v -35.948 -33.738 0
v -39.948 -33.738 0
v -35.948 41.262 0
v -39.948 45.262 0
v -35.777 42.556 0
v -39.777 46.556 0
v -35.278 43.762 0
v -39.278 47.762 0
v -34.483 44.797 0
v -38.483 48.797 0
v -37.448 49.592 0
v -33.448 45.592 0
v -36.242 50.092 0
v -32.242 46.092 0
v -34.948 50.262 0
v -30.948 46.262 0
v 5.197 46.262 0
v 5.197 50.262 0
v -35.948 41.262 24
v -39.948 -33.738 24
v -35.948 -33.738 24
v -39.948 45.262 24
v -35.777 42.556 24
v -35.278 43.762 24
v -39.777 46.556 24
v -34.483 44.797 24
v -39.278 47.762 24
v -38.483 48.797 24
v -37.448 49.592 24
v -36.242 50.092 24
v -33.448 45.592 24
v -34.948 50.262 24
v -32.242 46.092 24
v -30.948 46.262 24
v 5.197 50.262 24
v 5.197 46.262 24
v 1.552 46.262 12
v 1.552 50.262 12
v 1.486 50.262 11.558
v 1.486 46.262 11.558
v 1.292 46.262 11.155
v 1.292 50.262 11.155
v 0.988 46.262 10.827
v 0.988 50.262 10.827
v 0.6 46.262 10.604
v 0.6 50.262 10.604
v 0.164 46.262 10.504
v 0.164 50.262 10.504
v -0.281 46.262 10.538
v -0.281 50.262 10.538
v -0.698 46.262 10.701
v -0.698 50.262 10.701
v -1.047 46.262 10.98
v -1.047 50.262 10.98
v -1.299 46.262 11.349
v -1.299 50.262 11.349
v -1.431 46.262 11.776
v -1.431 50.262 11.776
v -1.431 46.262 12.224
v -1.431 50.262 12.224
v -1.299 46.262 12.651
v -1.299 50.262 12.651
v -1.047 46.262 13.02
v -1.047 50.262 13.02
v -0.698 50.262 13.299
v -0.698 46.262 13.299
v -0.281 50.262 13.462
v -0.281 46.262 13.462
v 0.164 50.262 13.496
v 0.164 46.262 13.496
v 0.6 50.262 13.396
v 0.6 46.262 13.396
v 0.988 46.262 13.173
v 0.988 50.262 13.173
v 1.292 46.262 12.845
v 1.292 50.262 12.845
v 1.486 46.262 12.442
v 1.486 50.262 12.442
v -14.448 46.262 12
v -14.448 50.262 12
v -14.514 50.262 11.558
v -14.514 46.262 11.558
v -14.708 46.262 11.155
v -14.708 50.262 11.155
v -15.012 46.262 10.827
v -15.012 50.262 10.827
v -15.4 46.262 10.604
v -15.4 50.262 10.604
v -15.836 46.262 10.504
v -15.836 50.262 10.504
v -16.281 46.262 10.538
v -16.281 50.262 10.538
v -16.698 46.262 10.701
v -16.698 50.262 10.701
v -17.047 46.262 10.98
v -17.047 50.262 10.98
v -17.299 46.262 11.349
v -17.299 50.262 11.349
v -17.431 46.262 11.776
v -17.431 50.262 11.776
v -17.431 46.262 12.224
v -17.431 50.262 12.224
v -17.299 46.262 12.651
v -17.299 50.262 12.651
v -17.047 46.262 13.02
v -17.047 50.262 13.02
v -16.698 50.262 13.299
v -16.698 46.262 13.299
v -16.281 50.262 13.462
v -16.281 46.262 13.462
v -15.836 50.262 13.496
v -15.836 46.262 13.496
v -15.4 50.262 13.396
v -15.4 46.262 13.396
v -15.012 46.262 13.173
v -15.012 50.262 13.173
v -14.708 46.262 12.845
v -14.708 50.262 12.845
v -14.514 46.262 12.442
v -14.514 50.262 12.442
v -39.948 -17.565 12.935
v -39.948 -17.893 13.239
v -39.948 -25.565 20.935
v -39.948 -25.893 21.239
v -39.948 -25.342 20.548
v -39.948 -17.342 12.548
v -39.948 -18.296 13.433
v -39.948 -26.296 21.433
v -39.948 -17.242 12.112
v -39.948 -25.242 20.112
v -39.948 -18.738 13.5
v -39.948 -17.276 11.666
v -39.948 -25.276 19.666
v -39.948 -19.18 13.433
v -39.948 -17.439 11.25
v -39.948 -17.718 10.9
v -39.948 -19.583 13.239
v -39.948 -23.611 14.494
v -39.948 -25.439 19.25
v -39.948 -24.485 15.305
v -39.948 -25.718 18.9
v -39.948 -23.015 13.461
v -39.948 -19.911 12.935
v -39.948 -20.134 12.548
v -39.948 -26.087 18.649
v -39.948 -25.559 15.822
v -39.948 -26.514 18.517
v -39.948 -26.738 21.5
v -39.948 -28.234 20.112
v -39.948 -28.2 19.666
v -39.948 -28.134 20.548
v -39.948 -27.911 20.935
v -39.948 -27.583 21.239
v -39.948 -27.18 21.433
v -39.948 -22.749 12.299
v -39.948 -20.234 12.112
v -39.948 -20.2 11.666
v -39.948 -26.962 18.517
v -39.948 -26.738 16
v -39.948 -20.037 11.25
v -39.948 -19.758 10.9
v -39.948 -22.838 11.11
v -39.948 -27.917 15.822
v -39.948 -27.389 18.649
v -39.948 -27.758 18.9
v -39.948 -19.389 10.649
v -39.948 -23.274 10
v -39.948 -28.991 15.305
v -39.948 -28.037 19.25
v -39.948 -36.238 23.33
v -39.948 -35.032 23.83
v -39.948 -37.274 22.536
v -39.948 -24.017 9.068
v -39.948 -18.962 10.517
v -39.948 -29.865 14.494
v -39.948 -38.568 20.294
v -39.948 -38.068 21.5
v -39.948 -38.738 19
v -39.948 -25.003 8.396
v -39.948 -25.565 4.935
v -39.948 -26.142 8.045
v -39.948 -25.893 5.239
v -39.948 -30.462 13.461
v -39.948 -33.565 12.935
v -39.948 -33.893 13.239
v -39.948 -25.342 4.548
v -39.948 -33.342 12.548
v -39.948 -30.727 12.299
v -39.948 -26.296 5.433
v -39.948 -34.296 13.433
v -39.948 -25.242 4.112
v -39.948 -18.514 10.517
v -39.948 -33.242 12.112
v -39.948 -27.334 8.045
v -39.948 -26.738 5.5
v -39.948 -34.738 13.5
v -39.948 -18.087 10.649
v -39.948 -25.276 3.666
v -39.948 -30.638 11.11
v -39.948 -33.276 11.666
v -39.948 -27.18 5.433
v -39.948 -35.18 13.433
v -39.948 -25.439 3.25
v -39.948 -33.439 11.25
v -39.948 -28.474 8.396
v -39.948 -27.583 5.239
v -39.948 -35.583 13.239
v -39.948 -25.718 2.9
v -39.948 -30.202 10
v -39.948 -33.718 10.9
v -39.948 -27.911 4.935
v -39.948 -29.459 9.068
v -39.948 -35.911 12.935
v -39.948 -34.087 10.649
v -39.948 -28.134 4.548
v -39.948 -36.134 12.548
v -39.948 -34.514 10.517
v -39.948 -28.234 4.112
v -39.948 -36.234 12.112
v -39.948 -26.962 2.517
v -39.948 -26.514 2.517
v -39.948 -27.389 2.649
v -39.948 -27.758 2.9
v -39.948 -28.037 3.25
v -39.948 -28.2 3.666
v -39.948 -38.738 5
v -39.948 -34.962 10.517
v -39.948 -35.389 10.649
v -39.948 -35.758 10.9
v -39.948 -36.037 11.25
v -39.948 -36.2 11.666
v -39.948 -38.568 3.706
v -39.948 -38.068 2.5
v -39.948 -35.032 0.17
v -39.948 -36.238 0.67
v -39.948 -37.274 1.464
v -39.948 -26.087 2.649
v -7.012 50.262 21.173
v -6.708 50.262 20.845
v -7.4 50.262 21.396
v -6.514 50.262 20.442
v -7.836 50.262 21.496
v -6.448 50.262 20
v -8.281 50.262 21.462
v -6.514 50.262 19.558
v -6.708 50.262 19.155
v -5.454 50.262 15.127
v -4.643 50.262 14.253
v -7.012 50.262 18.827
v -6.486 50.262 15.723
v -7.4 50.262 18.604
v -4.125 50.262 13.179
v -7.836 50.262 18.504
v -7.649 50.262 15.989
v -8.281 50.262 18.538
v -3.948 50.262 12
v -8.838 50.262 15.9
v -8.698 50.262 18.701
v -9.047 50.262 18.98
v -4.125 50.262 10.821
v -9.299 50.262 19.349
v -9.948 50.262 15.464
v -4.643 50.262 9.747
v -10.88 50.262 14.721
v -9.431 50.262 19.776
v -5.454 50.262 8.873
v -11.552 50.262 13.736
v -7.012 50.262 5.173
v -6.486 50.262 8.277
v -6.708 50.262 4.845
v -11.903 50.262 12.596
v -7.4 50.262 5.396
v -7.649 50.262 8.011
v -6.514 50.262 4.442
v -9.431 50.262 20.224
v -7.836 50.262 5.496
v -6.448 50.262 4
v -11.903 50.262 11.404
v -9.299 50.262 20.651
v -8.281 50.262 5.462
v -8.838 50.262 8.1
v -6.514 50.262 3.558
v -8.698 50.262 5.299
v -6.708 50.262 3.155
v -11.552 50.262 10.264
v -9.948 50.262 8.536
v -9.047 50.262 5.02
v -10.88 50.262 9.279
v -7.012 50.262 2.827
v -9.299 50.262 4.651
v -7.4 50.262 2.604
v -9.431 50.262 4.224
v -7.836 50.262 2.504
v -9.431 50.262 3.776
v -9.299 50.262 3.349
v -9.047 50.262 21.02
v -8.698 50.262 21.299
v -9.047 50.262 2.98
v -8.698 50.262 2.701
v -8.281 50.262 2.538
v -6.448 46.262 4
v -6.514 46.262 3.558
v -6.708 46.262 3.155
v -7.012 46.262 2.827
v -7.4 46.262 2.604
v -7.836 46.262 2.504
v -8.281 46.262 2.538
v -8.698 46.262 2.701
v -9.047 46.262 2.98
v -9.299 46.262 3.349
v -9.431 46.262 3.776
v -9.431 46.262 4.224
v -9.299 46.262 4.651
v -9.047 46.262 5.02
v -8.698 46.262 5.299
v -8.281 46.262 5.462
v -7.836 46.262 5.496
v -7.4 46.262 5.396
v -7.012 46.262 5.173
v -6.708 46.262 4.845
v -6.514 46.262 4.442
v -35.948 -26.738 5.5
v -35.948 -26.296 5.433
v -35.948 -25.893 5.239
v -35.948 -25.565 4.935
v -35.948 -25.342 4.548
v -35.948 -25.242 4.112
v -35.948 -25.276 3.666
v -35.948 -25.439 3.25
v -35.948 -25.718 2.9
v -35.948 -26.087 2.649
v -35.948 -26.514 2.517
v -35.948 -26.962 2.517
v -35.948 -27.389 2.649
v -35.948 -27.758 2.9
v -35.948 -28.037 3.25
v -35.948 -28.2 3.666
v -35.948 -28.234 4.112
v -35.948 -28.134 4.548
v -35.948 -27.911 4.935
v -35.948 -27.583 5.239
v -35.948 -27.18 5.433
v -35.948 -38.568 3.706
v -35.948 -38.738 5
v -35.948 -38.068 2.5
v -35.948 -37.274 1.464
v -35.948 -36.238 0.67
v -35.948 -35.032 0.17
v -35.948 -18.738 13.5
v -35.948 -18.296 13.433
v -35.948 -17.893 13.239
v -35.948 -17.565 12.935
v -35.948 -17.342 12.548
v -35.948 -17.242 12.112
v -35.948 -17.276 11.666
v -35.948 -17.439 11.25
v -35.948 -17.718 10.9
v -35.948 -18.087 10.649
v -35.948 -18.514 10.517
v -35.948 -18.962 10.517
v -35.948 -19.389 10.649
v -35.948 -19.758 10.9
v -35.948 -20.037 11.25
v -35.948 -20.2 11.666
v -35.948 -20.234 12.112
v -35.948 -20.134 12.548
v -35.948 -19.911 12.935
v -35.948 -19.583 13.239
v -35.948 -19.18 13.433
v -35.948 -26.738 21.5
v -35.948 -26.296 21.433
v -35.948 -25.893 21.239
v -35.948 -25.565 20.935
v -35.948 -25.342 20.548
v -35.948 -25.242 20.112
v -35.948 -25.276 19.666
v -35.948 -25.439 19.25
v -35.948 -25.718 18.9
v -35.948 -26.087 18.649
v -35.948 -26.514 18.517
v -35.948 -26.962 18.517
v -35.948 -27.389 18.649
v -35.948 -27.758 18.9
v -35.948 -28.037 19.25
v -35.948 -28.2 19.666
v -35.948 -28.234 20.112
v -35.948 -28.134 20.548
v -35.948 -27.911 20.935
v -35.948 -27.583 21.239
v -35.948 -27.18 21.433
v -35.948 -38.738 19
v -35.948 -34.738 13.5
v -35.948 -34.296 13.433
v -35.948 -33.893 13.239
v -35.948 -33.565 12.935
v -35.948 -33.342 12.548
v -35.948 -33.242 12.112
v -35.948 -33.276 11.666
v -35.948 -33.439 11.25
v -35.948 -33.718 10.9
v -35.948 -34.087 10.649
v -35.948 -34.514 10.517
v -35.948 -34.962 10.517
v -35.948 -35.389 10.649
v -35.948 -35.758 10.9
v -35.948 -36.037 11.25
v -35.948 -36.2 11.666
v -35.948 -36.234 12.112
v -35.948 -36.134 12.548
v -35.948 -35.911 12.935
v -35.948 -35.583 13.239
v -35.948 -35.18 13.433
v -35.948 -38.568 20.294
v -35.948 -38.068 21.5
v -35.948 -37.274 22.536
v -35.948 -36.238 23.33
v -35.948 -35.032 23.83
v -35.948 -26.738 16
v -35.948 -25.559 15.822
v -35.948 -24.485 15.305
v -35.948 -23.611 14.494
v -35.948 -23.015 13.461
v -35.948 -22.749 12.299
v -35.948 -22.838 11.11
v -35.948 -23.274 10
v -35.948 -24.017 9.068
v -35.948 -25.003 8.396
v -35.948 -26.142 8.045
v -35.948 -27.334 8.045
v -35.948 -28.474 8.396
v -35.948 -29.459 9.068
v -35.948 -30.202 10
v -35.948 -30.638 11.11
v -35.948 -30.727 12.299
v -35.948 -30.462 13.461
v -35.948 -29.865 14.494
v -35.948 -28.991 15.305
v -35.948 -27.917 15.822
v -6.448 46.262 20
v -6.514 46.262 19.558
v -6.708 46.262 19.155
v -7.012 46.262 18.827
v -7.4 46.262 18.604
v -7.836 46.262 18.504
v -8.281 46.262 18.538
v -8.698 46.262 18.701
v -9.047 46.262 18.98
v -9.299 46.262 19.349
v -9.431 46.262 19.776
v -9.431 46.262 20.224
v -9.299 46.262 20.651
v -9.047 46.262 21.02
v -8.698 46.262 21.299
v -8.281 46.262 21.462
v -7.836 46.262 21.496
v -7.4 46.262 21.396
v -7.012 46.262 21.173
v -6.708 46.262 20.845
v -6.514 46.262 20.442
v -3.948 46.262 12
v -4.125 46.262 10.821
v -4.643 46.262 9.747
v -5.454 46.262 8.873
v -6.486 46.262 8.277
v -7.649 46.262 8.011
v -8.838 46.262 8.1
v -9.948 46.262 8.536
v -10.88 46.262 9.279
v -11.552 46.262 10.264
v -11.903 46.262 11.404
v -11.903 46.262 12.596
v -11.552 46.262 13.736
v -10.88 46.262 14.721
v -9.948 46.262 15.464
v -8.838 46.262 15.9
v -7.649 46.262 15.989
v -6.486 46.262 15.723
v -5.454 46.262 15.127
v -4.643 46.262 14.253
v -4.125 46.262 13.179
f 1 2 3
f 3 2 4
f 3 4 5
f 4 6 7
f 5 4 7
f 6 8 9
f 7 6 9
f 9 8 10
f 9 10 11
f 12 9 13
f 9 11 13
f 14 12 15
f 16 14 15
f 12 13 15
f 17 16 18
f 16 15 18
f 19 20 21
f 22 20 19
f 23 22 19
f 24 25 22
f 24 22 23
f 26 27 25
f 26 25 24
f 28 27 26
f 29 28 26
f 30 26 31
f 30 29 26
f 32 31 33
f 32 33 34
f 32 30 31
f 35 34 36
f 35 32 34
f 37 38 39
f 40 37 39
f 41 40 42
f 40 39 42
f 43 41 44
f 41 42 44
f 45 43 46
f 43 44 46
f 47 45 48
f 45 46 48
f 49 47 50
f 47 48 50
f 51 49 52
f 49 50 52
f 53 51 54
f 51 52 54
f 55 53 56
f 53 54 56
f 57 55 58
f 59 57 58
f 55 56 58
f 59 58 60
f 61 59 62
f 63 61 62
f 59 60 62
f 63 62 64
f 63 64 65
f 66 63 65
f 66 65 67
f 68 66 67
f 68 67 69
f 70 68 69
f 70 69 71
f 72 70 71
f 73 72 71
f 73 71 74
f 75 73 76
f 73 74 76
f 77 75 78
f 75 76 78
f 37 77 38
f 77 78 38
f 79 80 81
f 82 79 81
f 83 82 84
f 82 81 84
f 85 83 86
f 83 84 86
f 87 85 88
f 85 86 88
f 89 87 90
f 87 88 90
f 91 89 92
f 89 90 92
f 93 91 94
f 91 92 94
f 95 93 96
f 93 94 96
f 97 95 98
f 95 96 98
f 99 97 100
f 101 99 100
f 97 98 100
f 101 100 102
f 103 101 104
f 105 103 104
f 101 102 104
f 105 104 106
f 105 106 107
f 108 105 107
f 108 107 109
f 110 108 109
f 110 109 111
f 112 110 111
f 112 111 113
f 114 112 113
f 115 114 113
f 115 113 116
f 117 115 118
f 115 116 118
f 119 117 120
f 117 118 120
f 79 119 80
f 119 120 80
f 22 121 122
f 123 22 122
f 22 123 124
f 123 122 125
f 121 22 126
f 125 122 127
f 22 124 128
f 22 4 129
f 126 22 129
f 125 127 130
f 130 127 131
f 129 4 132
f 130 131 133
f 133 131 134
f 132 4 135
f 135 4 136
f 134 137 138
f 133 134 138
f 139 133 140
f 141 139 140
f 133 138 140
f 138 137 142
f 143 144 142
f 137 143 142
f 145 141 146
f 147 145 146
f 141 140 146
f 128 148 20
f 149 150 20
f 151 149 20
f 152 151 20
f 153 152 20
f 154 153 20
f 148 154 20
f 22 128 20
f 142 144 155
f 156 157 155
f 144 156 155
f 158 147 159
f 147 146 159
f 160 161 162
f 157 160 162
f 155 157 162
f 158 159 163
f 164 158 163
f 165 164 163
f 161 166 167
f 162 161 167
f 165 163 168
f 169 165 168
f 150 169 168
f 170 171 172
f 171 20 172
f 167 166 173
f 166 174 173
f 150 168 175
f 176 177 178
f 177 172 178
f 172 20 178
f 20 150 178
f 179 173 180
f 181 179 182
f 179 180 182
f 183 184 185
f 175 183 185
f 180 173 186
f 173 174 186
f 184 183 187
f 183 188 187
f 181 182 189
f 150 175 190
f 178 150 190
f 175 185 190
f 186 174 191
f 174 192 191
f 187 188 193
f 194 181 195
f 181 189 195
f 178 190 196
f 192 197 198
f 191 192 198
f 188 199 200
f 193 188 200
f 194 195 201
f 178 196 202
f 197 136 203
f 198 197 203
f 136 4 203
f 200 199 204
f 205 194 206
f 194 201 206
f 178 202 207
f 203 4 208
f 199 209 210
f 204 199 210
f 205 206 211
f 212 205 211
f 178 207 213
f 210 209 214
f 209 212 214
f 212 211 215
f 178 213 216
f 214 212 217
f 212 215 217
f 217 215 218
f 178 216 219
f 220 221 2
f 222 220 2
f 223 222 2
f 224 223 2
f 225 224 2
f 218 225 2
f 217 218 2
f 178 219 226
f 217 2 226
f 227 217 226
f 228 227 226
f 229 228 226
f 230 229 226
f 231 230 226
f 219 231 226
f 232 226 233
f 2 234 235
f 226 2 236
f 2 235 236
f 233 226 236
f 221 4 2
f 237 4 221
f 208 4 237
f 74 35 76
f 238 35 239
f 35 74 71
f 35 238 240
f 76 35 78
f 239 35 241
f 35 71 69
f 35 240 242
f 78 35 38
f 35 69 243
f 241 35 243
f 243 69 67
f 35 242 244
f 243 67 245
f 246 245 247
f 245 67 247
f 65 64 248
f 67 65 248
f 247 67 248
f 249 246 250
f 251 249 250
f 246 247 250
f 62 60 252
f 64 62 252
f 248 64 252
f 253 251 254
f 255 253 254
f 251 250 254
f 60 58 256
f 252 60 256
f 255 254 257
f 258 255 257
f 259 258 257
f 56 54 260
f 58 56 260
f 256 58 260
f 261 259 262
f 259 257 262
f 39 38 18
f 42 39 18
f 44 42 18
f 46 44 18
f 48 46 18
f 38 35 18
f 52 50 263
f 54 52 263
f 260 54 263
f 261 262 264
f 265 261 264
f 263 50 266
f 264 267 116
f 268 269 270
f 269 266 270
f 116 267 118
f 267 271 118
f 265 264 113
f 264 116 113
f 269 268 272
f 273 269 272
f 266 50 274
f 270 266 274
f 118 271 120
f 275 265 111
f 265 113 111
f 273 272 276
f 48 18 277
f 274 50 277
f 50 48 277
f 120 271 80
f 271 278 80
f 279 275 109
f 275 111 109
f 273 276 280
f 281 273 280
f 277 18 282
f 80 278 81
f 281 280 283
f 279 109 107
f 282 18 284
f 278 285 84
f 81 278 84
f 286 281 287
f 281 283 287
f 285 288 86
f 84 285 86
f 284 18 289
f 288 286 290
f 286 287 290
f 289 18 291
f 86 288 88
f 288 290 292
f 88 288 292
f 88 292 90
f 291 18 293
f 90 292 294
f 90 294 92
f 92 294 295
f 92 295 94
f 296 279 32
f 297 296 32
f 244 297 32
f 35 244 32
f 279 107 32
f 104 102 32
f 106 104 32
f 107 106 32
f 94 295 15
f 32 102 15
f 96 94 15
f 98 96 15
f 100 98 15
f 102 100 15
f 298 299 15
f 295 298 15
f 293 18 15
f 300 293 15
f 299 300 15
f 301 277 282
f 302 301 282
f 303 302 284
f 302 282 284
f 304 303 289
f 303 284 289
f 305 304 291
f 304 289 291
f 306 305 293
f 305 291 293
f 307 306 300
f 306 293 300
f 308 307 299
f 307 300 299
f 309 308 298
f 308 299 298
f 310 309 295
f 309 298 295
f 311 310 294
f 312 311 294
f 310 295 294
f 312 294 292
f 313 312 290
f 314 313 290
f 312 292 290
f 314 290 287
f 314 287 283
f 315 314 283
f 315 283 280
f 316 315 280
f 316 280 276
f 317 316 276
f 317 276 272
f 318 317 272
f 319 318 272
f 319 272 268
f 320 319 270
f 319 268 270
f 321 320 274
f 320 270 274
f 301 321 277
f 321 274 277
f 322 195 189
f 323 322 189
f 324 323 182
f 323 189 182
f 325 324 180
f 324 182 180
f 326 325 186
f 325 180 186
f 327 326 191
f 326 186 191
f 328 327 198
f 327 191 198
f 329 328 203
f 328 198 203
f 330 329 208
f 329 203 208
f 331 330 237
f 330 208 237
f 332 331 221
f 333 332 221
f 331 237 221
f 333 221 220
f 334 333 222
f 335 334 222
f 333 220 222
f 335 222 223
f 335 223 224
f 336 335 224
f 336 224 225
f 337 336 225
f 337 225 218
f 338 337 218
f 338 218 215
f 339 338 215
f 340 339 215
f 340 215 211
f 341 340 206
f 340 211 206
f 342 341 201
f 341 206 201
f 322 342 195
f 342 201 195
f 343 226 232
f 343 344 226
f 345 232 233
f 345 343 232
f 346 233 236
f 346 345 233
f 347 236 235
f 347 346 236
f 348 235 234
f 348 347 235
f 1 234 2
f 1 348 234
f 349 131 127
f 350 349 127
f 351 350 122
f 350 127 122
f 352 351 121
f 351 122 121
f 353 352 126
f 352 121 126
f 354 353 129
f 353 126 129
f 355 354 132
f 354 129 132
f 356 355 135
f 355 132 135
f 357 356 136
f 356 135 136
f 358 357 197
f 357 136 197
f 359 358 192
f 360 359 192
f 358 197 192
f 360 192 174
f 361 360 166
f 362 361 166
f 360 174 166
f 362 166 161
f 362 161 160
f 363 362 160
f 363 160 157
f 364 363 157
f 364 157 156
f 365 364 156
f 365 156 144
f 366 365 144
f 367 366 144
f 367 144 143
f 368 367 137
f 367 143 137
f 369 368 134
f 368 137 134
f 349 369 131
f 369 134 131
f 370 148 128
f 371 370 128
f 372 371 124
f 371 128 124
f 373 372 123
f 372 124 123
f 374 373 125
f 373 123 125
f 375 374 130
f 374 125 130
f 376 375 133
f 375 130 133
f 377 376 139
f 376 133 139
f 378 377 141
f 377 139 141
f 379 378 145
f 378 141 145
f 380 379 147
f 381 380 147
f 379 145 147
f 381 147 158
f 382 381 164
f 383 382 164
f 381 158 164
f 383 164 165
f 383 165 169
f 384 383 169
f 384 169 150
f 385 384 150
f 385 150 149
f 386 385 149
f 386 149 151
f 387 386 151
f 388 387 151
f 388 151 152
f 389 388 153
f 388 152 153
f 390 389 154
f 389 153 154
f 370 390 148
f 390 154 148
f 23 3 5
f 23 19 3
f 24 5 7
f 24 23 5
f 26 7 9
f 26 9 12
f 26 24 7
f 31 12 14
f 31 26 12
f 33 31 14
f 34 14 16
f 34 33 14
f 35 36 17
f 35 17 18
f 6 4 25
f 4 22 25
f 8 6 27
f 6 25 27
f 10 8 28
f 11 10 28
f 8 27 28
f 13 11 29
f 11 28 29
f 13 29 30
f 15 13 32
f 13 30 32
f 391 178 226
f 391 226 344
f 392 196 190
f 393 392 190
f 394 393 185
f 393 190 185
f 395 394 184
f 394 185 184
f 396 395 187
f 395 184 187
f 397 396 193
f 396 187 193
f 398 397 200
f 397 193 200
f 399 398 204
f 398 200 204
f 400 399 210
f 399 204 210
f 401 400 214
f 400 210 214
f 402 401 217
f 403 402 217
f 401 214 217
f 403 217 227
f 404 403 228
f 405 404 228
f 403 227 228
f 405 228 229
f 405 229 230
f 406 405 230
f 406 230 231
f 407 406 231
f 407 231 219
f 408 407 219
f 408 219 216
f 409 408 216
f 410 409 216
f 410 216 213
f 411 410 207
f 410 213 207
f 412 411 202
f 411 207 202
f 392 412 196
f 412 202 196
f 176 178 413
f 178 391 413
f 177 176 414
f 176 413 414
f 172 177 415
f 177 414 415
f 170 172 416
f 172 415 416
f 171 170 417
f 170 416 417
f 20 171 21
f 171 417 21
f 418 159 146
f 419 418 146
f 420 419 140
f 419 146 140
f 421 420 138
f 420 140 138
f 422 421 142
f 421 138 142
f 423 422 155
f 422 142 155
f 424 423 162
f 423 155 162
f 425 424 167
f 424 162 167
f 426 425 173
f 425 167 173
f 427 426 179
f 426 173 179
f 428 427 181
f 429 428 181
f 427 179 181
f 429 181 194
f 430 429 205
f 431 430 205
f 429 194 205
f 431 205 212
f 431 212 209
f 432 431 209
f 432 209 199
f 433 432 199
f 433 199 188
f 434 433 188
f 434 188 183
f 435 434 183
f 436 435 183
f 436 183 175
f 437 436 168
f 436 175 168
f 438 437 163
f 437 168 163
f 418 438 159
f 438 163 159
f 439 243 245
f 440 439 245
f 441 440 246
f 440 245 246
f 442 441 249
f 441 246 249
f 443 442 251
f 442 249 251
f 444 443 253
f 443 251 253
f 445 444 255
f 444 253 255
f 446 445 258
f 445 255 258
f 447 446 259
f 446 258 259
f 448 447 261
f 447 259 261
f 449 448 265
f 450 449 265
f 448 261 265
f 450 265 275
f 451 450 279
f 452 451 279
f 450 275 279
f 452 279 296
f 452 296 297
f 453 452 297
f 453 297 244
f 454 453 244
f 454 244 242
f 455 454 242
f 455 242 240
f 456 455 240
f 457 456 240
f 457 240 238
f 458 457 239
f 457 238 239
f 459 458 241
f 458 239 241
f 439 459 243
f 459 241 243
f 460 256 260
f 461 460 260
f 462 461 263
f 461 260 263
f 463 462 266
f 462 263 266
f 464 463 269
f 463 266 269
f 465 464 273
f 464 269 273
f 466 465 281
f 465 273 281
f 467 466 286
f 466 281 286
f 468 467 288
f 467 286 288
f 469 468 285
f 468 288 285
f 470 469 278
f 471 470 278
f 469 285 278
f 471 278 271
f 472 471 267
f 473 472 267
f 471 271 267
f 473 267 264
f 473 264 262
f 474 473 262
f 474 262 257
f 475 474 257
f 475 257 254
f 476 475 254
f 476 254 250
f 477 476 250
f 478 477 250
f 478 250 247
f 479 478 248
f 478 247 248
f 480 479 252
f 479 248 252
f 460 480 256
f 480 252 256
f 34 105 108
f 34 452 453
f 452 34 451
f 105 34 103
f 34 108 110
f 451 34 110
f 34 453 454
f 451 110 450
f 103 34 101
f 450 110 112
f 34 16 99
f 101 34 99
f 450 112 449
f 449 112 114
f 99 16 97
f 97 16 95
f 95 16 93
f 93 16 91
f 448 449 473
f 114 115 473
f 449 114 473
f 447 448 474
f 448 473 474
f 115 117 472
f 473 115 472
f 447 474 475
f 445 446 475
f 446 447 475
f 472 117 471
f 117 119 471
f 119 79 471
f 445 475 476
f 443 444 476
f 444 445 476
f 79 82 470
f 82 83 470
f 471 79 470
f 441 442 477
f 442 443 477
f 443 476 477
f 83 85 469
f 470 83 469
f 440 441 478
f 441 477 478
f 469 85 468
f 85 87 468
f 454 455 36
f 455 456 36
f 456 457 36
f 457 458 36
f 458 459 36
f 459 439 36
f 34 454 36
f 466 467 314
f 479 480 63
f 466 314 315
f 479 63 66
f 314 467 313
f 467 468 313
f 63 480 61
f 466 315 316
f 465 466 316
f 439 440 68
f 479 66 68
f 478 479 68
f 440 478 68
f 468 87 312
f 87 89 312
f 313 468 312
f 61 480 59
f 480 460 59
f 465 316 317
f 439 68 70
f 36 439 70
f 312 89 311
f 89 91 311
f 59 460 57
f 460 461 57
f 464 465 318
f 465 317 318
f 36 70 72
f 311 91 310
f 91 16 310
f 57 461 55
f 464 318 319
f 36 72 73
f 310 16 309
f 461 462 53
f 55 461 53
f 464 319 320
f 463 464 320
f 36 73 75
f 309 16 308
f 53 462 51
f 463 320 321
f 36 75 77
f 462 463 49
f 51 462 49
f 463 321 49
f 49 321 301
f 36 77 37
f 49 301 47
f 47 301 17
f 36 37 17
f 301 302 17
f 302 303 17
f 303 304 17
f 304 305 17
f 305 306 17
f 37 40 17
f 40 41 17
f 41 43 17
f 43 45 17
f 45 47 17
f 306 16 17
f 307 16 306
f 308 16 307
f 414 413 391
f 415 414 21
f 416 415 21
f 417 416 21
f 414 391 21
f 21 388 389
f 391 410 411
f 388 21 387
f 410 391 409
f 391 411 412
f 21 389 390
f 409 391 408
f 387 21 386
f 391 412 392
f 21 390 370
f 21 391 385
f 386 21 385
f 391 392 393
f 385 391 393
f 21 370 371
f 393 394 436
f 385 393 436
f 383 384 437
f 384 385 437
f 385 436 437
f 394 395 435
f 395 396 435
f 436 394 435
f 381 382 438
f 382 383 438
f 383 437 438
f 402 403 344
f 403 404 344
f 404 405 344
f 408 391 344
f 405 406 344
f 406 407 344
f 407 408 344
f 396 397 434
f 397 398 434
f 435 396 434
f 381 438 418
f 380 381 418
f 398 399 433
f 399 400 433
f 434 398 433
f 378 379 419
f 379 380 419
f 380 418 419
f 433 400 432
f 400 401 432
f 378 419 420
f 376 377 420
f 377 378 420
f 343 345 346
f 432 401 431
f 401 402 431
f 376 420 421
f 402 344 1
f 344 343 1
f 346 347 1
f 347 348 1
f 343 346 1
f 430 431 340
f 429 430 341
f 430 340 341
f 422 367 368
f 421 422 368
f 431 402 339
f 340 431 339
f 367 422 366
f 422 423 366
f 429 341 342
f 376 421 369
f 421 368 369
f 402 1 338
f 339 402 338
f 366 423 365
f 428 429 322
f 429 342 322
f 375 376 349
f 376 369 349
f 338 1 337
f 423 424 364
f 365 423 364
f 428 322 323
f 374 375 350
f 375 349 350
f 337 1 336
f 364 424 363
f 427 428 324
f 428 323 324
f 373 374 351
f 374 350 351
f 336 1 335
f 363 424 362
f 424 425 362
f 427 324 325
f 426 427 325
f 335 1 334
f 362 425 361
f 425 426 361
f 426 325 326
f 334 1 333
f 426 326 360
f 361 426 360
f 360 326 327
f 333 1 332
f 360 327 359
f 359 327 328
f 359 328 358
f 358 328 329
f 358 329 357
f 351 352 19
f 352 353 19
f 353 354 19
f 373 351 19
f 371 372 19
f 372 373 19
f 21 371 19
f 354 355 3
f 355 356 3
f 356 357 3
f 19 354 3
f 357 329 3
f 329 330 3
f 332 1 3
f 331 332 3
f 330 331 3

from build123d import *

# Parameters (mm, degrees)
BOSS_EXTRUDE1_DEPTH = 24
SKETCH3_R           = 4
SKETCH3_R_2         = 1.5
CUT_EXTRUDE2_DEPTH  = 4
SKETCH6_R           = 4
SKETCH6_R_2         = 1.5
CUT_EXTRUDE3_DEPTH  = 4
FILLET1_R           = 5


with BuildPart() as part:
    # Sketch1 → Boss-Extrude1 (new body)
    with BuildSketch(Plane.XY):
        Polygon((-35.947712149, -38.738038278), (-35.947712149, 46.261961722), (5.197050303, 46.261961722), (5.197050303, 50.261961722), (-39.947712149, 50.261961722), (-39.947712149, -38.738038278), align=None)
    extrude(amount=BOSS_EXTRUDE1_DEPTH)

    # Sketch3 → Cut-Extrude2 (cut)
    with BuildSketch(Plane.ZY.offset(39.947712149)):
        with Locations((12, -26.738038278)):
            Circle(SKETCH3_R)
        with Locations((20, -26.738038278)):
            Circle(SKETCH3_R_2)
        with Locations((12, -34.738038278)):
            Circle(SKETCH3_R_2)
        with Locations((4, -26.738038278)):
            Circle(SKETCH3_R_2)
        with Locations((12, -18.738038278)):
            Circle(SKETCH3_R_2)
    extrude(amount=-CUT_EXTRUDE2_DEPTH, mode=Mode.SUBTRACT)

    # Sketch6 → Cut-Extrude3 (cut)
    with BuildSketch(Plane(origin=(0, 50.261961722, 0), x_dir=(1, 0, 0), z_dir=(0, 1, 0))):
        with Locations((-7.947712149, -12)):
            Circle(SKETCH6_R)
        with Locations((0.052287851, -12)):
            Circle(SKETCH6_R_2)
        with Locations((-7.947712149, -20)):
            Circle(SKETCH6_R_2)
        with Locations((-15.947712149, -12)):
            Circle(SKETCH6_R_2)
        with Locations((-7.947712149, -4)):
            Circle(SKETCH6_R_2)
    extrude(amount=-CUT_EXTRUDE3_DEPTH, mode=Mode.SUBTRACT)

    # Fillet1
    fillet1_edges = [part.edges().sort_by_distance(p)[0] for p in [
        (-35.947712149, 46.261961722, 12),
        (-39.947712149, 50.261961722, 12),
        (-37.947712149, -38.738038278, 24),
        (-37.947712149, -38.738038278, 0),
    ]]
    fillet(fillet1_edges, radius=FILLET1_R)


solid = part.part
